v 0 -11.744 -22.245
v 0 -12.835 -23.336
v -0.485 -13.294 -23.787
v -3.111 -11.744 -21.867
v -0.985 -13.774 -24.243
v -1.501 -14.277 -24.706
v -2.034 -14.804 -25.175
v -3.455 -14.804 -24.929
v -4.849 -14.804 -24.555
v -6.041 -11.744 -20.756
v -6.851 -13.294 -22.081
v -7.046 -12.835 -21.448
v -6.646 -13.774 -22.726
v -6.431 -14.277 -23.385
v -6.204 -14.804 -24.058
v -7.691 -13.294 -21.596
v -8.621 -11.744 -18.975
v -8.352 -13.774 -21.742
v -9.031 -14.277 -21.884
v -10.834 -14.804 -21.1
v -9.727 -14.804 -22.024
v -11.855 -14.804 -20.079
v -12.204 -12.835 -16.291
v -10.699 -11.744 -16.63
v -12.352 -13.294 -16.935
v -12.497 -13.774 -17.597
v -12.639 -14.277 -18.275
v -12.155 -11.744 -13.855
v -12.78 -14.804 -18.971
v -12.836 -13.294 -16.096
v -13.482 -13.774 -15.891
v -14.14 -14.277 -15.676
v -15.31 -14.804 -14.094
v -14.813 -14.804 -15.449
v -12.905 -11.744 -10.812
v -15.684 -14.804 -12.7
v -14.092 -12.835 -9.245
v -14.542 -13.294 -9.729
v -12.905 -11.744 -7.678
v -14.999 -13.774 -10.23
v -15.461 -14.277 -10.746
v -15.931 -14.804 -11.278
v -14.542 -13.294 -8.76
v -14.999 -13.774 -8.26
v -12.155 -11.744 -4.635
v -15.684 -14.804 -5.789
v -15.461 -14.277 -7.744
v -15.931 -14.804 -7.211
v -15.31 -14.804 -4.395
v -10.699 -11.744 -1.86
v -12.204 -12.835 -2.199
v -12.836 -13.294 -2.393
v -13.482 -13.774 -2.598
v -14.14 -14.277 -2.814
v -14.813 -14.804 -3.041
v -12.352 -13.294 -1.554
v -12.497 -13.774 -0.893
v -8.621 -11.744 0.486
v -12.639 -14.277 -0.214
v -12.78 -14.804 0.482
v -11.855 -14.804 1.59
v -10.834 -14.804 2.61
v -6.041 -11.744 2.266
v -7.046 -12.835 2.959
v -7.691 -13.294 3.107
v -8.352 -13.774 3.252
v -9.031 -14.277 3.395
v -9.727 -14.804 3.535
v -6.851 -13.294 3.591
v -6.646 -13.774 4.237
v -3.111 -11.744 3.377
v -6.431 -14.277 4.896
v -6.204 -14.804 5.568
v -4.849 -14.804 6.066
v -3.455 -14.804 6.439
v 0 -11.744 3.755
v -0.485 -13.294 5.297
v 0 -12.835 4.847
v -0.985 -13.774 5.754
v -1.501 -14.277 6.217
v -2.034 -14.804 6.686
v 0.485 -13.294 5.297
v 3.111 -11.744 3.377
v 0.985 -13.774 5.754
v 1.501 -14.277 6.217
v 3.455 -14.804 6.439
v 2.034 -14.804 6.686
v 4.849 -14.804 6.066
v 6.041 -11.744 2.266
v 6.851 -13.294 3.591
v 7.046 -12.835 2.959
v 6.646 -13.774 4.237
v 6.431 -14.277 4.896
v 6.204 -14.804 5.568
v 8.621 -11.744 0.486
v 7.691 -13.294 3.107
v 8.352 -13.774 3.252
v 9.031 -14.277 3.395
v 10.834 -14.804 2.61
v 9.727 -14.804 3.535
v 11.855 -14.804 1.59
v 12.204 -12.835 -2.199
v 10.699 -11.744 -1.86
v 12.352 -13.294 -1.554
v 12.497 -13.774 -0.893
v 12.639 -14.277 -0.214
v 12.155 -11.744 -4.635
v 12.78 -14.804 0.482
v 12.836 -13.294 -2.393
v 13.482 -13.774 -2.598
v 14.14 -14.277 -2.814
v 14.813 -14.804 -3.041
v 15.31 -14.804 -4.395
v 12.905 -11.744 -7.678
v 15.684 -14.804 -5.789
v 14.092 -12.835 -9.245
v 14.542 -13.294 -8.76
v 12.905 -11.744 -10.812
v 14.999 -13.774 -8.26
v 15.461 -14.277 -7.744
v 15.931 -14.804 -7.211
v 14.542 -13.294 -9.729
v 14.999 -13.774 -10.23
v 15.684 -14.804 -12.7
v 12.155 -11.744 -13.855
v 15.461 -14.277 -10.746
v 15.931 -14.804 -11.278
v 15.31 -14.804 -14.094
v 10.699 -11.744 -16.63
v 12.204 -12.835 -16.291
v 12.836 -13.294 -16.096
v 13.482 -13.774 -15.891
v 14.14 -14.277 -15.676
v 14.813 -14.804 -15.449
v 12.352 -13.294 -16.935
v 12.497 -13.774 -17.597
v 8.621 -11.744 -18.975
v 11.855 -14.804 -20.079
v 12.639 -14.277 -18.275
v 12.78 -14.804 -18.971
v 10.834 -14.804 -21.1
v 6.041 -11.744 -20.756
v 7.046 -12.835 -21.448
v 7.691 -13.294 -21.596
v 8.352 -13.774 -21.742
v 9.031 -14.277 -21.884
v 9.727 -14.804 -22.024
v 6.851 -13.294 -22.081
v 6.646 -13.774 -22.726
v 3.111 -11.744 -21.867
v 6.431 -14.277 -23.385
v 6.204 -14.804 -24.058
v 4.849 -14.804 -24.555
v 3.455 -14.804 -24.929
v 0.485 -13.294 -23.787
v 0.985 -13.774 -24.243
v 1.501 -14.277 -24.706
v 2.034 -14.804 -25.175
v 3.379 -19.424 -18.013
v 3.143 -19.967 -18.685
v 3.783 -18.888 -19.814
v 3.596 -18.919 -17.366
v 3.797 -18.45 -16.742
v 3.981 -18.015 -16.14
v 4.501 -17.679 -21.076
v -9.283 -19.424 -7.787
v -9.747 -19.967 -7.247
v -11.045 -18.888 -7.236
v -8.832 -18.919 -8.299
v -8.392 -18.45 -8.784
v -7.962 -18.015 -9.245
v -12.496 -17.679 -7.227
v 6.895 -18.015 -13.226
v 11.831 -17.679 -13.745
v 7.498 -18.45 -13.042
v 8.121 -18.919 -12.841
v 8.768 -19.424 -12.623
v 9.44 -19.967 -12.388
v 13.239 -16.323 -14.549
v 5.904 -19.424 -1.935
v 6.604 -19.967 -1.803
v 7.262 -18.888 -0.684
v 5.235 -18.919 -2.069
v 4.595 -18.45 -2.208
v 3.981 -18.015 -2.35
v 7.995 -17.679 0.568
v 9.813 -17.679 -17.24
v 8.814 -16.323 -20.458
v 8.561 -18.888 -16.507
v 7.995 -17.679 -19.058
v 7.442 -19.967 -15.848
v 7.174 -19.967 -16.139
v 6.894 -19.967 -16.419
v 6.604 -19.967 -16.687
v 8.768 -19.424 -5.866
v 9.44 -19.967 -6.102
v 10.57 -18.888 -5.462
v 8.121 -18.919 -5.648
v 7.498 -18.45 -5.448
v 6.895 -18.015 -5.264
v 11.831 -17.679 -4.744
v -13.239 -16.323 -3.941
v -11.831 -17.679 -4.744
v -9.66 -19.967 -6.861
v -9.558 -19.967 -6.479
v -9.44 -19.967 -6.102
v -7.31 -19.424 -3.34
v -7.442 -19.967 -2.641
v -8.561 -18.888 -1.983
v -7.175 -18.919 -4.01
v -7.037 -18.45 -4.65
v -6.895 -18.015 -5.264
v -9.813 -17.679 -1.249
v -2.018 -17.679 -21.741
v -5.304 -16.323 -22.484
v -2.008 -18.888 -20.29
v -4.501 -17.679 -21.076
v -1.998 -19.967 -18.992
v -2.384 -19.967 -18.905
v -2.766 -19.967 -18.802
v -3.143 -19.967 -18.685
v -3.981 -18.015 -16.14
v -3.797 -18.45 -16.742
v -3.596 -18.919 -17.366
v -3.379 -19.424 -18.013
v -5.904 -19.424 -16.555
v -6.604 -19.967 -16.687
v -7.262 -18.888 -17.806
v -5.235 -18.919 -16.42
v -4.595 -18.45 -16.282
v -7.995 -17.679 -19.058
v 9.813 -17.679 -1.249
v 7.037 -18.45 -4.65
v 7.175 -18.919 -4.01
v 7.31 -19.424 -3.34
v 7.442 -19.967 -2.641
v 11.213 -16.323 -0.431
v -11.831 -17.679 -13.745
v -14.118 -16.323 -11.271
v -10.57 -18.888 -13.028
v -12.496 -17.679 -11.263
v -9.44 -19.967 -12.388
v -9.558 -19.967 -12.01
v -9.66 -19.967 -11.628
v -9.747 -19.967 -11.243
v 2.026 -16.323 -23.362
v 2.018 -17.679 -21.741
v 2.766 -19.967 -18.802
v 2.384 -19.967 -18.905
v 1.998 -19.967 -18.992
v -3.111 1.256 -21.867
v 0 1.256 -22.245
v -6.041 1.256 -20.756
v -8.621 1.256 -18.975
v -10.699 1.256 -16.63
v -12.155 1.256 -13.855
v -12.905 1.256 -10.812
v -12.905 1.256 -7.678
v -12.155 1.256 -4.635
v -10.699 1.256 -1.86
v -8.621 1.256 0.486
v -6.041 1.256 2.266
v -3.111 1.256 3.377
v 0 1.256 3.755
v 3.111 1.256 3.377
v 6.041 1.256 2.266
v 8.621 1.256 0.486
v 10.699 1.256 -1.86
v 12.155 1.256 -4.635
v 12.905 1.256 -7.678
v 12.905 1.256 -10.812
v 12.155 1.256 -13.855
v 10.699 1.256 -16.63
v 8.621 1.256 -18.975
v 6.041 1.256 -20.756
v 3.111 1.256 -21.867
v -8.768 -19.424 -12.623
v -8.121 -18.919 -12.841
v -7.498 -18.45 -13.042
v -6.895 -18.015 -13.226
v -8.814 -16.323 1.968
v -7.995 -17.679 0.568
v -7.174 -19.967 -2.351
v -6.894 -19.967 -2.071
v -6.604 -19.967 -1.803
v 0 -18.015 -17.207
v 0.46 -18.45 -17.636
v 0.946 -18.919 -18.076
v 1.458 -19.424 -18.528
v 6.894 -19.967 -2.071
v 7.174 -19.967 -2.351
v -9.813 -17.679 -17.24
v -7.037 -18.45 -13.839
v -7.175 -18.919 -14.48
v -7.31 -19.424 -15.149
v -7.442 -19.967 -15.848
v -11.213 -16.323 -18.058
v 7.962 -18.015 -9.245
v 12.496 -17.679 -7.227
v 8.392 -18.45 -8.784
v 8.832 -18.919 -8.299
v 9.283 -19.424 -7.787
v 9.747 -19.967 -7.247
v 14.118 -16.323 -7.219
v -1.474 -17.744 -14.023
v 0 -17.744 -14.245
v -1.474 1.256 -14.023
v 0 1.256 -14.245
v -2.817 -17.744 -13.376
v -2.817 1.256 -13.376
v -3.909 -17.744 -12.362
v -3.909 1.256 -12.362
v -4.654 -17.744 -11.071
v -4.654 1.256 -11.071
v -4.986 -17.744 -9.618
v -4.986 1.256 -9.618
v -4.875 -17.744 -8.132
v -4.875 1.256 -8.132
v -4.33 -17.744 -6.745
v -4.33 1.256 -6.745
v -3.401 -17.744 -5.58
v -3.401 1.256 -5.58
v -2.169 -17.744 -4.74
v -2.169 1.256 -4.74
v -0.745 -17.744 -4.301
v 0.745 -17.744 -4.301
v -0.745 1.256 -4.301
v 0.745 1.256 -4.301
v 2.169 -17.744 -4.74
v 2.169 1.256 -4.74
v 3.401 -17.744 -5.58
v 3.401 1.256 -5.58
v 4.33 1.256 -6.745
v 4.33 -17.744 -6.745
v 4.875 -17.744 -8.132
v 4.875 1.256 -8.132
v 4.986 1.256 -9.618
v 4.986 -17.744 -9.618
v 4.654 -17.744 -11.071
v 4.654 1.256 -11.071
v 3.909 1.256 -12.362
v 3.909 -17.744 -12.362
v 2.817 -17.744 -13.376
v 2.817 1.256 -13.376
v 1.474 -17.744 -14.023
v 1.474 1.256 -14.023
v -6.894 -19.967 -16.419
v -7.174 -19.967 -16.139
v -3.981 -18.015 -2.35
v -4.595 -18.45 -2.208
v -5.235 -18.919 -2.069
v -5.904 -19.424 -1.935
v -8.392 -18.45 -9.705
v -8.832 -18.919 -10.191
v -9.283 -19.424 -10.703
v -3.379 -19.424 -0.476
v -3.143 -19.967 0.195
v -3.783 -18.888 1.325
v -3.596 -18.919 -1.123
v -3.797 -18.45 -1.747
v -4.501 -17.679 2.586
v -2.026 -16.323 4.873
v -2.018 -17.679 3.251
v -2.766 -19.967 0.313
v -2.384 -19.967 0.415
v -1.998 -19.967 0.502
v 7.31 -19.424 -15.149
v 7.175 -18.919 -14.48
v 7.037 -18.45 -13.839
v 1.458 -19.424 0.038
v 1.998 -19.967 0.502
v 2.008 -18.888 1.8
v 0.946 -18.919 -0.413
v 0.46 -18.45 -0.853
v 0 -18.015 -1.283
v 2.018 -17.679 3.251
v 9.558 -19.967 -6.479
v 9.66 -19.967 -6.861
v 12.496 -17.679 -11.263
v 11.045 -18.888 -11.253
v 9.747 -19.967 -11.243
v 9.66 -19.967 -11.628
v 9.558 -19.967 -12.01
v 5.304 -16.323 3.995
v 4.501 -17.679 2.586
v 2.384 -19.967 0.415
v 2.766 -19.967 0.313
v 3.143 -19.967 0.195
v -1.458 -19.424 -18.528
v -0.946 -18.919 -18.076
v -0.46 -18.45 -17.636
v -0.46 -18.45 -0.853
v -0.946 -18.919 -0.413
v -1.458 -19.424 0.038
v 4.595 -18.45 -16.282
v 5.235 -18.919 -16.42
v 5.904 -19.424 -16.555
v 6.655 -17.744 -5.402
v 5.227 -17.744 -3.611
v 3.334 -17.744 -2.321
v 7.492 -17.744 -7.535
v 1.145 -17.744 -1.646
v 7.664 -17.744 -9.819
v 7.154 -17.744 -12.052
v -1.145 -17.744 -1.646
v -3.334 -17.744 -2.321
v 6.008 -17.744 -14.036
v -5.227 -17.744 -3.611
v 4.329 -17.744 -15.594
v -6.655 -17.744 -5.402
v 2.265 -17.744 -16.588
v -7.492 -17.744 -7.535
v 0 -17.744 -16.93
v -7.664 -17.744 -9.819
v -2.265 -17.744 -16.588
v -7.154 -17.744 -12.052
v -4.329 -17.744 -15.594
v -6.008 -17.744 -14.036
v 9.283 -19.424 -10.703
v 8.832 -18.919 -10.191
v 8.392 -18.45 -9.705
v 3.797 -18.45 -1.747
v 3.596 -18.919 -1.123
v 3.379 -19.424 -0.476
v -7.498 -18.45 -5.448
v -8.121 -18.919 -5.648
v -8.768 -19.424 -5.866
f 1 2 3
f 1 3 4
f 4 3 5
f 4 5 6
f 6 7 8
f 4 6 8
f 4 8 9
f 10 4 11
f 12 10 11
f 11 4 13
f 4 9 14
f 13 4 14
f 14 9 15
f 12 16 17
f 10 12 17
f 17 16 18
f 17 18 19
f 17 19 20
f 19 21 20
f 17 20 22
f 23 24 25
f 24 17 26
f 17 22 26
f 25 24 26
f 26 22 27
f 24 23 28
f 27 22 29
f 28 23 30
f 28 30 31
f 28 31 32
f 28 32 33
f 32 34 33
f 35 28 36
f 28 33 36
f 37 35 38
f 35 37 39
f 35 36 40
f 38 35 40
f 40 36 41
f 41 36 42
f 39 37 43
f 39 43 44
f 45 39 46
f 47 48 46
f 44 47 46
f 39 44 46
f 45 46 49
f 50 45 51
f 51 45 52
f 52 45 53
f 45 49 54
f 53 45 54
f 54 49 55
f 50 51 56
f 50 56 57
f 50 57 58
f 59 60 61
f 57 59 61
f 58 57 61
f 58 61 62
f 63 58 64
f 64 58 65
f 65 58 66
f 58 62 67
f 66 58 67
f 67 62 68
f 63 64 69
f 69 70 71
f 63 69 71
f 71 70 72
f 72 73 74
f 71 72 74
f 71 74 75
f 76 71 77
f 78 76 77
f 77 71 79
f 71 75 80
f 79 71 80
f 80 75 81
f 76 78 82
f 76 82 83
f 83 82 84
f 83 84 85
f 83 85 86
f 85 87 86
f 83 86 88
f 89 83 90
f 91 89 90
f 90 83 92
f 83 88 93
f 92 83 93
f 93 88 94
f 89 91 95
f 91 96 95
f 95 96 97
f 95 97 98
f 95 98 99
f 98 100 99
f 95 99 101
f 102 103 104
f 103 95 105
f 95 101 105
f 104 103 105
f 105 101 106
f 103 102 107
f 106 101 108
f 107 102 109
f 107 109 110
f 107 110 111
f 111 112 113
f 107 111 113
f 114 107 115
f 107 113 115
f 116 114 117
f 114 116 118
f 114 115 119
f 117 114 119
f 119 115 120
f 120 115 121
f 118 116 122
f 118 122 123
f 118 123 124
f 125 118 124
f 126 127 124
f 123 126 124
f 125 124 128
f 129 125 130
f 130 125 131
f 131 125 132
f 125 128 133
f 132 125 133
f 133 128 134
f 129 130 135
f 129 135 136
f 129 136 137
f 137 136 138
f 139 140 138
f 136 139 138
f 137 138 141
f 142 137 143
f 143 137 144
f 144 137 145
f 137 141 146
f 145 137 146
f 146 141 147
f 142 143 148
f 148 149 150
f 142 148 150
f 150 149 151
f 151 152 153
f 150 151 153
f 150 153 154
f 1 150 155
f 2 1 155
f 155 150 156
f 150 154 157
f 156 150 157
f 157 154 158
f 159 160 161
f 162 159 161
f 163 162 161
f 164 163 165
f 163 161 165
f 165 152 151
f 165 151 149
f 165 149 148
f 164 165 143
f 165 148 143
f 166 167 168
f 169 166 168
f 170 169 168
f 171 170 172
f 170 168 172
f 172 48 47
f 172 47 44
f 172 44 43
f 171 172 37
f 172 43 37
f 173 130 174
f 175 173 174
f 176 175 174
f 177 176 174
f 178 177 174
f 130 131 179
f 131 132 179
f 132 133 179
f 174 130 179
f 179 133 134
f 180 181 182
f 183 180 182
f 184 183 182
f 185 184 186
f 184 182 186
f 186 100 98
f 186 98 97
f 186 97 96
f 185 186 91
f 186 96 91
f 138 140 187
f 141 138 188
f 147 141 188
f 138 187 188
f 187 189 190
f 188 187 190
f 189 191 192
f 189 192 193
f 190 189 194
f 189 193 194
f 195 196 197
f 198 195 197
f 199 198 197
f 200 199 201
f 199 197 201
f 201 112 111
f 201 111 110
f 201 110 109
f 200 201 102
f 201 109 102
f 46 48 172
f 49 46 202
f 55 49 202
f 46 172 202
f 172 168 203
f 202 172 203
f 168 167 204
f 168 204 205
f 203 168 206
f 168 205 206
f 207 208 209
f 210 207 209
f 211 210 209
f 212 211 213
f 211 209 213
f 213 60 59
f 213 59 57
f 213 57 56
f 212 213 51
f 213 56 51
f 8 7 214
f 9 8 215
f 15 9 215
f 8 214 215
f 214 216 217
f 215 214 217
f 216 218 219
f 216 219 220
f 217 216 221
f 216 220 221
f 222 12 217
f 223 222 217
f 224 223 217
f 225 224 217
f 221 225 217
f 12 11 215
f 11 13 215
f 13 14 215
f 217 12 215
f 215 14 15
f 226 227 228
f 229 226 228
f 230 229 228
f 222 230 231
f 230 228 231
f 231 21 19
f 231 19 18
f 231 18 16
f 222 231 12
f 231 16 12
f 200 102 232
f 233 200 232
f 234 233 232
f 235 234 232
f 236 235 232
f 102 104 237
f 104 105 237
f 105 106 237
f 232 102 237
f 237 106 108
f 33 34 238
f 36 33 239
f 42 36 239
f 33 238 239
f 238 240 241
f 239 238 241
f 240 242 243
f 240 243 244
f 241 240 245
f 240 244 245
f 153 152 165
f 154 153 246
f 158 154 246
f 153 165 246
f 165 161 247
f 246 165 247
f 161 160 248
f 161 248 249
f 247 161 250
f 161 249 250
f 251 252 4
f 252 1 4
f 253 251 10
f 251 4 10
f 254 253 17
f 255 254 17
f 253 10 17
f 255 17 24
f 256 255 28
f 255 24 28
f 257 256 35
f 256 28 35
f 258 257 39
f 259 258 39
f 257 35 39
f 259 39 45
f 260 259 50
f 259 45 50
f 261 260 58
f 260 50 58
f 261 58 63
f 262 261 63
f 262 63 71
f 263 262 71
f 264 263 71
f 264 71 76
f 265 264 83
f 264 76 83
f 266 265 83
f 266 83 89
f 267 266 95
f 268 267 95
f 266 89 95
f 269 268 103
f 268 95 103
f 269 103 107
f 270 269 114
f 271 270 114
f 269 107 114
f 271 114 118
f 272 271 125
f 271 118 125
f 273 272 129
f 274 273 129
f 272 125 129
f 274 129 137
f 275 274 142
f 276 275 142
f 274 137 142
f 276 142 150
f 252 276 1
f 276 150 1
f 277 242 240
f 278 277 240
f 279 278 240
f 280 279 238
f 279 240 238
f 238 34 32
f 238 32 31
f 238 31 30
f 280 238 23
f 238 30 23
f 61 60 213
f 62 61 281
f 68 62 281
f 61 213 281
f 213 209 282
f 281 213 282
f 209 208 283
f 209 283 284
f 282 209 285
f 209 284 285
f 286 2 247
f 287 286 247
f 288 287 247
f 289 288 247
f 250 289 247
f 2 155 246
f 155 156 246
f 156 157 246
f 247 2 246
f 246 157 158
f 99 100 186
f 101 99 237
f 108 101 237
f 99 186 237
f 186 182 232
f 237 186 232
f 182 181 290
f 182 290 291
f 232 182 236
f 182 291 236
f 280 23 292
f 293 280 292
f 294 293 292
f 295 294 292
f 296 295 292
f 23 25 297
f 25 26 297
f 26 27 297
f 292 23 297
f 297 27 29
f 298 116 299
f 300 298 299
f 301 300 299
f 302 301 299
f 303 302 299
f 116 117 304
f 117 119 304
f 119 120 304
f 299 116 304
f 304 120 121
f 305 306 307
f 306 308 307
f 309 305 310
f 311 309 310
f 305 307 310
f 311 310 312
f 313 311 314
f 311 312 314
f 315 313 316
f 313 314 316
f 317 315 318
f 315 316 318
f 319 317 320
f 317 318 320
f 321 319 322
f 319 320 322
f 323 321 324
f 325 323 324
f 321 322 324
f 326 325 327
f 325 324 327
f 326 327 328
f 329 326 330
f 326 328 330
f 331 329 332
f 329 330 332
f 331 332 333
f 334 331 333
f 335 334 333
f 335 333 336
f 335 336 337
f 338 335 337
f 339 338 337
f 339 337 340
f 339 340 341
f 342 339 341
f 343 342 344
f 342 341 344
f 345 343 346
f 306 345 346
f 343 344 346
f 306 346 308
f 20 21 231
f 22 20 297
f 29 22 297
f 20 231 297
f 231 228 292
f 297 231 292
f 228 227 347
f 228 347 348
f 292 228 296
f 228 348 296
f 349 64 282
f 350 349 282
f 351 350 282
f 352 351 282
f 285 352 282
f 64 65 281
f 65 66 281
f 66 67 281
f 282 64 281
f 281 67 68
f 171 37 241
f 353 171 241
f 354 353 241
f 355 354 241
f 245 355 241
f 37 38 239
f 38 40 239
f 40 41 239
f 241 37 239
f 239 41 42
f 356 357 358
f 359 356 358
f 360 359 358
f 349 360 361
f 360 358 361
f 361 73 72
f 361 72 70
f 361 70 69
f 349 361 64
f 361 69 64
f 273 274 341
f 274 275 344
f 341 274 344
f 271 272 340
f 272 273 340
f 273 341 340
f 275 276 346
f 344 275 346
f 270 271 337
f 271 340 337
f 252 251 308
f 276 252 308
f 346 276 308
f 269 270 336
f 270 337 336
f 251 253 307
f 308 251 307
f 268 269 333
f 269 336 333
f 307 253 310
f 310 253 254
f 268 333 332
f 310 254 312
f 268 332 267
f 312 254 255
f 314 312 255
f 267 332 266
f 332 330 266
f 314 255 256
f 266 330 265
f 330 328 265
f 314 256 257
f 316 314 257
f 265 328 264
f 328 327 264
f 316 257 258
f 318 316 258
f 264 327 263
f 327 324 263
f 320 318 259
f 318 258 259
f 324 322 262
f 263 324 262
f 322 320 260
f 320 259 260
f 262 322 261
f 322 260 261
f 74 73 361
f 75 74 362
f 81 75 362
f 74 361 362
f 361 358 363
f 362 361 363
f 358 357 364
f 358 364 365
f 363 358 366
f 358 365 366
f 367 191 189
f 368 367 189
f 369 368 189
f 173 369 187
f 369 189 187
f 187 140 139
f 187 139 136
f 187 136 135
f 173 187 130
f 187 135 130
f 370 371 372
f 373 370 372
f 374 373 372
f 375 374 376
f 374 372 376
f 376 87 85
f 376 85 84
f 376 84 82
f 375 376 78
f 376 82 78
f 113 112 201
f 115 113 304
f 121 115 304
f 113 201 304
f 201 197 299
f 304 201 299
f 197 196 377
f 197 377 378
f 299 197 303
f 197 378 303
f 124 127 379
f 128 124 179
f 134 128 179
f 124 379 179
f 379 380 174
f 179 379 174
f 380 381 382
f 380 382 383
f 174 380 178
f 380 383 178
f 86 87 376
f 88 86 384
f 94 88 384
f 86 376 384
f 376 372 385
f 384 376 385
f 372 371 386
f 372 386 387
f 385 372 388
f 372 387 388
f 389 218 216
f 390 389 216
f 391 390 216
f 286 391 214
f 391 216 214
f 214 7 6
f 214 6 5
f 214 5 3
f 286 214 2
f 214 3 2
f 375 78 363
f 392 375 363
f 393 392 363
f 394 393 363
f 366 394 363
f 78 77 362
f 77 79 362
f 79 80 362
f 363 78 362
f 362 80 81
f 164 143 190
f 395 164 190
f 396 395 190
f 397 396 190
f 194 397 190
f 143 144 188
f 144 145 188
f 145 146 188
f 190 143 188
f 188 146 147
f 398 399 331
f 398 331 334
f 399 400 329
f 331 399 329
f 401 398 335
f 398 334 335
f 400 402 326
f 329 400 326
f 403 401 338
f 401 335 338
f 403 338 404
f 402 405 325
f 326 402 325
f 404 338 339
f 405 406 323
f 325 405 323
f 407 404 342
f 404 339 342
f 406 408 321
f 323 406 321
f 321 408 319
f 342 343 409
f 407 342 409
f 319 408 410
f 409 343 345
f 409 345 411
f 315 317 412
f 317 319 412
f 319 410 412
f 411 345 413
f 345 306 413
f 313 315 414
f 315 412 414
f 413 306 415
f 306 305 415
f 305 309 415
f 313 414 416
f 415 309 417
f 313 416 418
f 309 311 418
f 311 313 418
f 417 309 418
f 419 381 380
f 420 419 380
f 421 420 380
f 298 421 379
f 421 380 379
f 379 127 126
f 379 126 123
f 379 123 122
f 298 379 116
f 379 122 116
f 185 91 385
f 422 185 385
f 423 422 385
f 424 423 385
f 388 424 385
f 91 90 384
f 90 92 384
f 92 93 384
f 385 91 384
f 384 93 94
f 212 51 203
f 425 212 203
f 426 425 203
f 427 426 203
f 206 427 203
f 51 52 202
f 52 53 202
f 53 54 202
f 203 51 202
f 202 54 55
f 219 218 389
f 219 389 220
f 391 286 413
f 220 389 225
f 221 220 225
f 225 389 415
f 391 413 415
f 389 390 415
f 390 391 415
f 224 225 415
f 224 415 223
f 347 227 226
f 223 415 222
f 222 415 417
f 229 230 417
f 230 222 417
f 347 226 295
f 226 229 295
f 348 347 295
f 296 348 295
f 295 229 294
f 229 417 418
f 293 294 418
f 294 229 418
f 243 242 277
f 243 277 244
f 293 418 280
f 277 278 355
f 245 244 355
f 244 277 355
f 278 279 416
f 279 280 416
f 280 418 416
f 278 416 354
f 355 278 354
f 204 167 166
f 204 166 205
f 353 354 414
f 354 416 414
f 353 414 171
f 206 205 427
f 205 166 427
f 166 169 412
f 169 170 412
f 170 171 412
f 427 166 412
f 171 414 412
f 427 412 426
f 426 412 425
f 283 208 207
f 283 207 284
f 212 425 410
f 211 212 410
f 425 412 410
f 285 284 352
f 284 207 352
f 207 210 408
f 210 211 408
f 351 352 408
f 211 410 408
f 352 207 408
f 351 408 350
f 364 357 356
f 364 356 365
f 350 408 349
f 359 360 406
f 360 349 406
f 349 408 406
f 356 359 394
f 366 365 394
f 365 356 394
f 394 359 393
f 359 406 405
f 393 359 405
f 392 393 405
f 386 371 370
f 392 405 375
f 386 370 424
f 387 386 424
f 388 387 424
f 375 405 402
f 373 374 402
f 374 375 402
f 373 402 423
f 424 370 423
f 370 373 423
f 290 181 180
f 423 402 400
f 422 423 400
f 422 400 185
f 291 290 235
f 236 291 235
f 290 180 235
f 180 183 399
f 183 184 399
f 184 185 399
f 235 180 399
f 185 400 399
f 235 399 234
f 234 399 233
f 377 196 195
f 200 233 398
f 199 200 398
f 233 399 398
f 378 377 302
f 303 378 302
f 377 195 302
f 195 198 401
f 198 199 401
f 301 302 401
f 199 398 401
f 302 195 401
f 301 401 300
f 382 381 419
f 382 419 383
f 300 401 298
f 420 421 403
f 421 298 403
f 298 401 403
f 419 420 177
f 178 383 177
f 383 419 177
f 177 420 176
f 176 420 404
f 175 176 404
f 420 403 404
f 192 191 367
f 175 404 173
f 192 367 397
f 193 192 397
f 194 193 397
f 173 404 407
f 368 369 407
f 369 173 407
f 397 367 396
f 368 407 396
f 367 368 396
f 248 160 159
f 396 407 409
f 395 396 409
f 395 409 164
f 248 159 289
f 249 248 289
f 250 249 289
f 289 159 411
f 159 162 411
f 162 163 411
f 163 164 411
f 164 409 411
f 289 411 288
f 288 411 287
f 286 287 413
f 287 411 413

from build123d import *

# Parameters (mm, degrees)
CIRPATTERN1_COUNT = 12


with BuildPart() as part:
    # Sketch2 → Revolve1 (revolve)
    with BuildSketch(Plane.YZ, mode=Mode.PRIVATE) as revolve1_sk:
        Polygon((-11.743521681, 3.755235238), (-14.803521681, 6.815235238), (-19.967183183, 0.704867009), (-17.743521681, -1.559764762), (-17.743521681, -4.244764762), (1.256478319, -4.244764762), (1.256478319, -1.559764762), (1.256478319, 3.755235238), align=None)
    revolve(revolve1_sk.sketch.rotate(Axis((0, -25.391509901, -9.244764762), (0, 1, 0)), 180), axis=Axis((0, -25.391509901, -9.244764762), (0, 1, 0)))

    # Cut-Sweep1: sweep along a path in Sketch8
    with BuildLine(Plane.YZ) as cut_sweep1_path:
        Line((-28.743521681, -9.244764762), (-15.053364124, 6.955349006))
    # Sketch9 → Cut-Sweep1 (sweep, cut)
    with BuildSketch(Plane.XY.offset(-9.244764762)):
        Polygon((3.464101615, -30.743521681), (0, -24.743521681), (-3.464101615, -30.743521681), align=None)
    cut_sweep1 = sweep(path=cut_sweep1_path.line, mode=Mode.SUBTRACT)

    # CirPattern1: Cut-Sweep1 ×12 about axis
    cirpattern1_axis = Axis((0, 0, -9.244764762), (0, 1, 0))
    for i in range(1, CIRPATTERN1_COUNT):
        add(cut_sweep1.rotate(cirpattern1_axis, i * 360 / CIRPATTERN1_COUNT), mode=Mode.SUBTRACT)


solid = part.part
